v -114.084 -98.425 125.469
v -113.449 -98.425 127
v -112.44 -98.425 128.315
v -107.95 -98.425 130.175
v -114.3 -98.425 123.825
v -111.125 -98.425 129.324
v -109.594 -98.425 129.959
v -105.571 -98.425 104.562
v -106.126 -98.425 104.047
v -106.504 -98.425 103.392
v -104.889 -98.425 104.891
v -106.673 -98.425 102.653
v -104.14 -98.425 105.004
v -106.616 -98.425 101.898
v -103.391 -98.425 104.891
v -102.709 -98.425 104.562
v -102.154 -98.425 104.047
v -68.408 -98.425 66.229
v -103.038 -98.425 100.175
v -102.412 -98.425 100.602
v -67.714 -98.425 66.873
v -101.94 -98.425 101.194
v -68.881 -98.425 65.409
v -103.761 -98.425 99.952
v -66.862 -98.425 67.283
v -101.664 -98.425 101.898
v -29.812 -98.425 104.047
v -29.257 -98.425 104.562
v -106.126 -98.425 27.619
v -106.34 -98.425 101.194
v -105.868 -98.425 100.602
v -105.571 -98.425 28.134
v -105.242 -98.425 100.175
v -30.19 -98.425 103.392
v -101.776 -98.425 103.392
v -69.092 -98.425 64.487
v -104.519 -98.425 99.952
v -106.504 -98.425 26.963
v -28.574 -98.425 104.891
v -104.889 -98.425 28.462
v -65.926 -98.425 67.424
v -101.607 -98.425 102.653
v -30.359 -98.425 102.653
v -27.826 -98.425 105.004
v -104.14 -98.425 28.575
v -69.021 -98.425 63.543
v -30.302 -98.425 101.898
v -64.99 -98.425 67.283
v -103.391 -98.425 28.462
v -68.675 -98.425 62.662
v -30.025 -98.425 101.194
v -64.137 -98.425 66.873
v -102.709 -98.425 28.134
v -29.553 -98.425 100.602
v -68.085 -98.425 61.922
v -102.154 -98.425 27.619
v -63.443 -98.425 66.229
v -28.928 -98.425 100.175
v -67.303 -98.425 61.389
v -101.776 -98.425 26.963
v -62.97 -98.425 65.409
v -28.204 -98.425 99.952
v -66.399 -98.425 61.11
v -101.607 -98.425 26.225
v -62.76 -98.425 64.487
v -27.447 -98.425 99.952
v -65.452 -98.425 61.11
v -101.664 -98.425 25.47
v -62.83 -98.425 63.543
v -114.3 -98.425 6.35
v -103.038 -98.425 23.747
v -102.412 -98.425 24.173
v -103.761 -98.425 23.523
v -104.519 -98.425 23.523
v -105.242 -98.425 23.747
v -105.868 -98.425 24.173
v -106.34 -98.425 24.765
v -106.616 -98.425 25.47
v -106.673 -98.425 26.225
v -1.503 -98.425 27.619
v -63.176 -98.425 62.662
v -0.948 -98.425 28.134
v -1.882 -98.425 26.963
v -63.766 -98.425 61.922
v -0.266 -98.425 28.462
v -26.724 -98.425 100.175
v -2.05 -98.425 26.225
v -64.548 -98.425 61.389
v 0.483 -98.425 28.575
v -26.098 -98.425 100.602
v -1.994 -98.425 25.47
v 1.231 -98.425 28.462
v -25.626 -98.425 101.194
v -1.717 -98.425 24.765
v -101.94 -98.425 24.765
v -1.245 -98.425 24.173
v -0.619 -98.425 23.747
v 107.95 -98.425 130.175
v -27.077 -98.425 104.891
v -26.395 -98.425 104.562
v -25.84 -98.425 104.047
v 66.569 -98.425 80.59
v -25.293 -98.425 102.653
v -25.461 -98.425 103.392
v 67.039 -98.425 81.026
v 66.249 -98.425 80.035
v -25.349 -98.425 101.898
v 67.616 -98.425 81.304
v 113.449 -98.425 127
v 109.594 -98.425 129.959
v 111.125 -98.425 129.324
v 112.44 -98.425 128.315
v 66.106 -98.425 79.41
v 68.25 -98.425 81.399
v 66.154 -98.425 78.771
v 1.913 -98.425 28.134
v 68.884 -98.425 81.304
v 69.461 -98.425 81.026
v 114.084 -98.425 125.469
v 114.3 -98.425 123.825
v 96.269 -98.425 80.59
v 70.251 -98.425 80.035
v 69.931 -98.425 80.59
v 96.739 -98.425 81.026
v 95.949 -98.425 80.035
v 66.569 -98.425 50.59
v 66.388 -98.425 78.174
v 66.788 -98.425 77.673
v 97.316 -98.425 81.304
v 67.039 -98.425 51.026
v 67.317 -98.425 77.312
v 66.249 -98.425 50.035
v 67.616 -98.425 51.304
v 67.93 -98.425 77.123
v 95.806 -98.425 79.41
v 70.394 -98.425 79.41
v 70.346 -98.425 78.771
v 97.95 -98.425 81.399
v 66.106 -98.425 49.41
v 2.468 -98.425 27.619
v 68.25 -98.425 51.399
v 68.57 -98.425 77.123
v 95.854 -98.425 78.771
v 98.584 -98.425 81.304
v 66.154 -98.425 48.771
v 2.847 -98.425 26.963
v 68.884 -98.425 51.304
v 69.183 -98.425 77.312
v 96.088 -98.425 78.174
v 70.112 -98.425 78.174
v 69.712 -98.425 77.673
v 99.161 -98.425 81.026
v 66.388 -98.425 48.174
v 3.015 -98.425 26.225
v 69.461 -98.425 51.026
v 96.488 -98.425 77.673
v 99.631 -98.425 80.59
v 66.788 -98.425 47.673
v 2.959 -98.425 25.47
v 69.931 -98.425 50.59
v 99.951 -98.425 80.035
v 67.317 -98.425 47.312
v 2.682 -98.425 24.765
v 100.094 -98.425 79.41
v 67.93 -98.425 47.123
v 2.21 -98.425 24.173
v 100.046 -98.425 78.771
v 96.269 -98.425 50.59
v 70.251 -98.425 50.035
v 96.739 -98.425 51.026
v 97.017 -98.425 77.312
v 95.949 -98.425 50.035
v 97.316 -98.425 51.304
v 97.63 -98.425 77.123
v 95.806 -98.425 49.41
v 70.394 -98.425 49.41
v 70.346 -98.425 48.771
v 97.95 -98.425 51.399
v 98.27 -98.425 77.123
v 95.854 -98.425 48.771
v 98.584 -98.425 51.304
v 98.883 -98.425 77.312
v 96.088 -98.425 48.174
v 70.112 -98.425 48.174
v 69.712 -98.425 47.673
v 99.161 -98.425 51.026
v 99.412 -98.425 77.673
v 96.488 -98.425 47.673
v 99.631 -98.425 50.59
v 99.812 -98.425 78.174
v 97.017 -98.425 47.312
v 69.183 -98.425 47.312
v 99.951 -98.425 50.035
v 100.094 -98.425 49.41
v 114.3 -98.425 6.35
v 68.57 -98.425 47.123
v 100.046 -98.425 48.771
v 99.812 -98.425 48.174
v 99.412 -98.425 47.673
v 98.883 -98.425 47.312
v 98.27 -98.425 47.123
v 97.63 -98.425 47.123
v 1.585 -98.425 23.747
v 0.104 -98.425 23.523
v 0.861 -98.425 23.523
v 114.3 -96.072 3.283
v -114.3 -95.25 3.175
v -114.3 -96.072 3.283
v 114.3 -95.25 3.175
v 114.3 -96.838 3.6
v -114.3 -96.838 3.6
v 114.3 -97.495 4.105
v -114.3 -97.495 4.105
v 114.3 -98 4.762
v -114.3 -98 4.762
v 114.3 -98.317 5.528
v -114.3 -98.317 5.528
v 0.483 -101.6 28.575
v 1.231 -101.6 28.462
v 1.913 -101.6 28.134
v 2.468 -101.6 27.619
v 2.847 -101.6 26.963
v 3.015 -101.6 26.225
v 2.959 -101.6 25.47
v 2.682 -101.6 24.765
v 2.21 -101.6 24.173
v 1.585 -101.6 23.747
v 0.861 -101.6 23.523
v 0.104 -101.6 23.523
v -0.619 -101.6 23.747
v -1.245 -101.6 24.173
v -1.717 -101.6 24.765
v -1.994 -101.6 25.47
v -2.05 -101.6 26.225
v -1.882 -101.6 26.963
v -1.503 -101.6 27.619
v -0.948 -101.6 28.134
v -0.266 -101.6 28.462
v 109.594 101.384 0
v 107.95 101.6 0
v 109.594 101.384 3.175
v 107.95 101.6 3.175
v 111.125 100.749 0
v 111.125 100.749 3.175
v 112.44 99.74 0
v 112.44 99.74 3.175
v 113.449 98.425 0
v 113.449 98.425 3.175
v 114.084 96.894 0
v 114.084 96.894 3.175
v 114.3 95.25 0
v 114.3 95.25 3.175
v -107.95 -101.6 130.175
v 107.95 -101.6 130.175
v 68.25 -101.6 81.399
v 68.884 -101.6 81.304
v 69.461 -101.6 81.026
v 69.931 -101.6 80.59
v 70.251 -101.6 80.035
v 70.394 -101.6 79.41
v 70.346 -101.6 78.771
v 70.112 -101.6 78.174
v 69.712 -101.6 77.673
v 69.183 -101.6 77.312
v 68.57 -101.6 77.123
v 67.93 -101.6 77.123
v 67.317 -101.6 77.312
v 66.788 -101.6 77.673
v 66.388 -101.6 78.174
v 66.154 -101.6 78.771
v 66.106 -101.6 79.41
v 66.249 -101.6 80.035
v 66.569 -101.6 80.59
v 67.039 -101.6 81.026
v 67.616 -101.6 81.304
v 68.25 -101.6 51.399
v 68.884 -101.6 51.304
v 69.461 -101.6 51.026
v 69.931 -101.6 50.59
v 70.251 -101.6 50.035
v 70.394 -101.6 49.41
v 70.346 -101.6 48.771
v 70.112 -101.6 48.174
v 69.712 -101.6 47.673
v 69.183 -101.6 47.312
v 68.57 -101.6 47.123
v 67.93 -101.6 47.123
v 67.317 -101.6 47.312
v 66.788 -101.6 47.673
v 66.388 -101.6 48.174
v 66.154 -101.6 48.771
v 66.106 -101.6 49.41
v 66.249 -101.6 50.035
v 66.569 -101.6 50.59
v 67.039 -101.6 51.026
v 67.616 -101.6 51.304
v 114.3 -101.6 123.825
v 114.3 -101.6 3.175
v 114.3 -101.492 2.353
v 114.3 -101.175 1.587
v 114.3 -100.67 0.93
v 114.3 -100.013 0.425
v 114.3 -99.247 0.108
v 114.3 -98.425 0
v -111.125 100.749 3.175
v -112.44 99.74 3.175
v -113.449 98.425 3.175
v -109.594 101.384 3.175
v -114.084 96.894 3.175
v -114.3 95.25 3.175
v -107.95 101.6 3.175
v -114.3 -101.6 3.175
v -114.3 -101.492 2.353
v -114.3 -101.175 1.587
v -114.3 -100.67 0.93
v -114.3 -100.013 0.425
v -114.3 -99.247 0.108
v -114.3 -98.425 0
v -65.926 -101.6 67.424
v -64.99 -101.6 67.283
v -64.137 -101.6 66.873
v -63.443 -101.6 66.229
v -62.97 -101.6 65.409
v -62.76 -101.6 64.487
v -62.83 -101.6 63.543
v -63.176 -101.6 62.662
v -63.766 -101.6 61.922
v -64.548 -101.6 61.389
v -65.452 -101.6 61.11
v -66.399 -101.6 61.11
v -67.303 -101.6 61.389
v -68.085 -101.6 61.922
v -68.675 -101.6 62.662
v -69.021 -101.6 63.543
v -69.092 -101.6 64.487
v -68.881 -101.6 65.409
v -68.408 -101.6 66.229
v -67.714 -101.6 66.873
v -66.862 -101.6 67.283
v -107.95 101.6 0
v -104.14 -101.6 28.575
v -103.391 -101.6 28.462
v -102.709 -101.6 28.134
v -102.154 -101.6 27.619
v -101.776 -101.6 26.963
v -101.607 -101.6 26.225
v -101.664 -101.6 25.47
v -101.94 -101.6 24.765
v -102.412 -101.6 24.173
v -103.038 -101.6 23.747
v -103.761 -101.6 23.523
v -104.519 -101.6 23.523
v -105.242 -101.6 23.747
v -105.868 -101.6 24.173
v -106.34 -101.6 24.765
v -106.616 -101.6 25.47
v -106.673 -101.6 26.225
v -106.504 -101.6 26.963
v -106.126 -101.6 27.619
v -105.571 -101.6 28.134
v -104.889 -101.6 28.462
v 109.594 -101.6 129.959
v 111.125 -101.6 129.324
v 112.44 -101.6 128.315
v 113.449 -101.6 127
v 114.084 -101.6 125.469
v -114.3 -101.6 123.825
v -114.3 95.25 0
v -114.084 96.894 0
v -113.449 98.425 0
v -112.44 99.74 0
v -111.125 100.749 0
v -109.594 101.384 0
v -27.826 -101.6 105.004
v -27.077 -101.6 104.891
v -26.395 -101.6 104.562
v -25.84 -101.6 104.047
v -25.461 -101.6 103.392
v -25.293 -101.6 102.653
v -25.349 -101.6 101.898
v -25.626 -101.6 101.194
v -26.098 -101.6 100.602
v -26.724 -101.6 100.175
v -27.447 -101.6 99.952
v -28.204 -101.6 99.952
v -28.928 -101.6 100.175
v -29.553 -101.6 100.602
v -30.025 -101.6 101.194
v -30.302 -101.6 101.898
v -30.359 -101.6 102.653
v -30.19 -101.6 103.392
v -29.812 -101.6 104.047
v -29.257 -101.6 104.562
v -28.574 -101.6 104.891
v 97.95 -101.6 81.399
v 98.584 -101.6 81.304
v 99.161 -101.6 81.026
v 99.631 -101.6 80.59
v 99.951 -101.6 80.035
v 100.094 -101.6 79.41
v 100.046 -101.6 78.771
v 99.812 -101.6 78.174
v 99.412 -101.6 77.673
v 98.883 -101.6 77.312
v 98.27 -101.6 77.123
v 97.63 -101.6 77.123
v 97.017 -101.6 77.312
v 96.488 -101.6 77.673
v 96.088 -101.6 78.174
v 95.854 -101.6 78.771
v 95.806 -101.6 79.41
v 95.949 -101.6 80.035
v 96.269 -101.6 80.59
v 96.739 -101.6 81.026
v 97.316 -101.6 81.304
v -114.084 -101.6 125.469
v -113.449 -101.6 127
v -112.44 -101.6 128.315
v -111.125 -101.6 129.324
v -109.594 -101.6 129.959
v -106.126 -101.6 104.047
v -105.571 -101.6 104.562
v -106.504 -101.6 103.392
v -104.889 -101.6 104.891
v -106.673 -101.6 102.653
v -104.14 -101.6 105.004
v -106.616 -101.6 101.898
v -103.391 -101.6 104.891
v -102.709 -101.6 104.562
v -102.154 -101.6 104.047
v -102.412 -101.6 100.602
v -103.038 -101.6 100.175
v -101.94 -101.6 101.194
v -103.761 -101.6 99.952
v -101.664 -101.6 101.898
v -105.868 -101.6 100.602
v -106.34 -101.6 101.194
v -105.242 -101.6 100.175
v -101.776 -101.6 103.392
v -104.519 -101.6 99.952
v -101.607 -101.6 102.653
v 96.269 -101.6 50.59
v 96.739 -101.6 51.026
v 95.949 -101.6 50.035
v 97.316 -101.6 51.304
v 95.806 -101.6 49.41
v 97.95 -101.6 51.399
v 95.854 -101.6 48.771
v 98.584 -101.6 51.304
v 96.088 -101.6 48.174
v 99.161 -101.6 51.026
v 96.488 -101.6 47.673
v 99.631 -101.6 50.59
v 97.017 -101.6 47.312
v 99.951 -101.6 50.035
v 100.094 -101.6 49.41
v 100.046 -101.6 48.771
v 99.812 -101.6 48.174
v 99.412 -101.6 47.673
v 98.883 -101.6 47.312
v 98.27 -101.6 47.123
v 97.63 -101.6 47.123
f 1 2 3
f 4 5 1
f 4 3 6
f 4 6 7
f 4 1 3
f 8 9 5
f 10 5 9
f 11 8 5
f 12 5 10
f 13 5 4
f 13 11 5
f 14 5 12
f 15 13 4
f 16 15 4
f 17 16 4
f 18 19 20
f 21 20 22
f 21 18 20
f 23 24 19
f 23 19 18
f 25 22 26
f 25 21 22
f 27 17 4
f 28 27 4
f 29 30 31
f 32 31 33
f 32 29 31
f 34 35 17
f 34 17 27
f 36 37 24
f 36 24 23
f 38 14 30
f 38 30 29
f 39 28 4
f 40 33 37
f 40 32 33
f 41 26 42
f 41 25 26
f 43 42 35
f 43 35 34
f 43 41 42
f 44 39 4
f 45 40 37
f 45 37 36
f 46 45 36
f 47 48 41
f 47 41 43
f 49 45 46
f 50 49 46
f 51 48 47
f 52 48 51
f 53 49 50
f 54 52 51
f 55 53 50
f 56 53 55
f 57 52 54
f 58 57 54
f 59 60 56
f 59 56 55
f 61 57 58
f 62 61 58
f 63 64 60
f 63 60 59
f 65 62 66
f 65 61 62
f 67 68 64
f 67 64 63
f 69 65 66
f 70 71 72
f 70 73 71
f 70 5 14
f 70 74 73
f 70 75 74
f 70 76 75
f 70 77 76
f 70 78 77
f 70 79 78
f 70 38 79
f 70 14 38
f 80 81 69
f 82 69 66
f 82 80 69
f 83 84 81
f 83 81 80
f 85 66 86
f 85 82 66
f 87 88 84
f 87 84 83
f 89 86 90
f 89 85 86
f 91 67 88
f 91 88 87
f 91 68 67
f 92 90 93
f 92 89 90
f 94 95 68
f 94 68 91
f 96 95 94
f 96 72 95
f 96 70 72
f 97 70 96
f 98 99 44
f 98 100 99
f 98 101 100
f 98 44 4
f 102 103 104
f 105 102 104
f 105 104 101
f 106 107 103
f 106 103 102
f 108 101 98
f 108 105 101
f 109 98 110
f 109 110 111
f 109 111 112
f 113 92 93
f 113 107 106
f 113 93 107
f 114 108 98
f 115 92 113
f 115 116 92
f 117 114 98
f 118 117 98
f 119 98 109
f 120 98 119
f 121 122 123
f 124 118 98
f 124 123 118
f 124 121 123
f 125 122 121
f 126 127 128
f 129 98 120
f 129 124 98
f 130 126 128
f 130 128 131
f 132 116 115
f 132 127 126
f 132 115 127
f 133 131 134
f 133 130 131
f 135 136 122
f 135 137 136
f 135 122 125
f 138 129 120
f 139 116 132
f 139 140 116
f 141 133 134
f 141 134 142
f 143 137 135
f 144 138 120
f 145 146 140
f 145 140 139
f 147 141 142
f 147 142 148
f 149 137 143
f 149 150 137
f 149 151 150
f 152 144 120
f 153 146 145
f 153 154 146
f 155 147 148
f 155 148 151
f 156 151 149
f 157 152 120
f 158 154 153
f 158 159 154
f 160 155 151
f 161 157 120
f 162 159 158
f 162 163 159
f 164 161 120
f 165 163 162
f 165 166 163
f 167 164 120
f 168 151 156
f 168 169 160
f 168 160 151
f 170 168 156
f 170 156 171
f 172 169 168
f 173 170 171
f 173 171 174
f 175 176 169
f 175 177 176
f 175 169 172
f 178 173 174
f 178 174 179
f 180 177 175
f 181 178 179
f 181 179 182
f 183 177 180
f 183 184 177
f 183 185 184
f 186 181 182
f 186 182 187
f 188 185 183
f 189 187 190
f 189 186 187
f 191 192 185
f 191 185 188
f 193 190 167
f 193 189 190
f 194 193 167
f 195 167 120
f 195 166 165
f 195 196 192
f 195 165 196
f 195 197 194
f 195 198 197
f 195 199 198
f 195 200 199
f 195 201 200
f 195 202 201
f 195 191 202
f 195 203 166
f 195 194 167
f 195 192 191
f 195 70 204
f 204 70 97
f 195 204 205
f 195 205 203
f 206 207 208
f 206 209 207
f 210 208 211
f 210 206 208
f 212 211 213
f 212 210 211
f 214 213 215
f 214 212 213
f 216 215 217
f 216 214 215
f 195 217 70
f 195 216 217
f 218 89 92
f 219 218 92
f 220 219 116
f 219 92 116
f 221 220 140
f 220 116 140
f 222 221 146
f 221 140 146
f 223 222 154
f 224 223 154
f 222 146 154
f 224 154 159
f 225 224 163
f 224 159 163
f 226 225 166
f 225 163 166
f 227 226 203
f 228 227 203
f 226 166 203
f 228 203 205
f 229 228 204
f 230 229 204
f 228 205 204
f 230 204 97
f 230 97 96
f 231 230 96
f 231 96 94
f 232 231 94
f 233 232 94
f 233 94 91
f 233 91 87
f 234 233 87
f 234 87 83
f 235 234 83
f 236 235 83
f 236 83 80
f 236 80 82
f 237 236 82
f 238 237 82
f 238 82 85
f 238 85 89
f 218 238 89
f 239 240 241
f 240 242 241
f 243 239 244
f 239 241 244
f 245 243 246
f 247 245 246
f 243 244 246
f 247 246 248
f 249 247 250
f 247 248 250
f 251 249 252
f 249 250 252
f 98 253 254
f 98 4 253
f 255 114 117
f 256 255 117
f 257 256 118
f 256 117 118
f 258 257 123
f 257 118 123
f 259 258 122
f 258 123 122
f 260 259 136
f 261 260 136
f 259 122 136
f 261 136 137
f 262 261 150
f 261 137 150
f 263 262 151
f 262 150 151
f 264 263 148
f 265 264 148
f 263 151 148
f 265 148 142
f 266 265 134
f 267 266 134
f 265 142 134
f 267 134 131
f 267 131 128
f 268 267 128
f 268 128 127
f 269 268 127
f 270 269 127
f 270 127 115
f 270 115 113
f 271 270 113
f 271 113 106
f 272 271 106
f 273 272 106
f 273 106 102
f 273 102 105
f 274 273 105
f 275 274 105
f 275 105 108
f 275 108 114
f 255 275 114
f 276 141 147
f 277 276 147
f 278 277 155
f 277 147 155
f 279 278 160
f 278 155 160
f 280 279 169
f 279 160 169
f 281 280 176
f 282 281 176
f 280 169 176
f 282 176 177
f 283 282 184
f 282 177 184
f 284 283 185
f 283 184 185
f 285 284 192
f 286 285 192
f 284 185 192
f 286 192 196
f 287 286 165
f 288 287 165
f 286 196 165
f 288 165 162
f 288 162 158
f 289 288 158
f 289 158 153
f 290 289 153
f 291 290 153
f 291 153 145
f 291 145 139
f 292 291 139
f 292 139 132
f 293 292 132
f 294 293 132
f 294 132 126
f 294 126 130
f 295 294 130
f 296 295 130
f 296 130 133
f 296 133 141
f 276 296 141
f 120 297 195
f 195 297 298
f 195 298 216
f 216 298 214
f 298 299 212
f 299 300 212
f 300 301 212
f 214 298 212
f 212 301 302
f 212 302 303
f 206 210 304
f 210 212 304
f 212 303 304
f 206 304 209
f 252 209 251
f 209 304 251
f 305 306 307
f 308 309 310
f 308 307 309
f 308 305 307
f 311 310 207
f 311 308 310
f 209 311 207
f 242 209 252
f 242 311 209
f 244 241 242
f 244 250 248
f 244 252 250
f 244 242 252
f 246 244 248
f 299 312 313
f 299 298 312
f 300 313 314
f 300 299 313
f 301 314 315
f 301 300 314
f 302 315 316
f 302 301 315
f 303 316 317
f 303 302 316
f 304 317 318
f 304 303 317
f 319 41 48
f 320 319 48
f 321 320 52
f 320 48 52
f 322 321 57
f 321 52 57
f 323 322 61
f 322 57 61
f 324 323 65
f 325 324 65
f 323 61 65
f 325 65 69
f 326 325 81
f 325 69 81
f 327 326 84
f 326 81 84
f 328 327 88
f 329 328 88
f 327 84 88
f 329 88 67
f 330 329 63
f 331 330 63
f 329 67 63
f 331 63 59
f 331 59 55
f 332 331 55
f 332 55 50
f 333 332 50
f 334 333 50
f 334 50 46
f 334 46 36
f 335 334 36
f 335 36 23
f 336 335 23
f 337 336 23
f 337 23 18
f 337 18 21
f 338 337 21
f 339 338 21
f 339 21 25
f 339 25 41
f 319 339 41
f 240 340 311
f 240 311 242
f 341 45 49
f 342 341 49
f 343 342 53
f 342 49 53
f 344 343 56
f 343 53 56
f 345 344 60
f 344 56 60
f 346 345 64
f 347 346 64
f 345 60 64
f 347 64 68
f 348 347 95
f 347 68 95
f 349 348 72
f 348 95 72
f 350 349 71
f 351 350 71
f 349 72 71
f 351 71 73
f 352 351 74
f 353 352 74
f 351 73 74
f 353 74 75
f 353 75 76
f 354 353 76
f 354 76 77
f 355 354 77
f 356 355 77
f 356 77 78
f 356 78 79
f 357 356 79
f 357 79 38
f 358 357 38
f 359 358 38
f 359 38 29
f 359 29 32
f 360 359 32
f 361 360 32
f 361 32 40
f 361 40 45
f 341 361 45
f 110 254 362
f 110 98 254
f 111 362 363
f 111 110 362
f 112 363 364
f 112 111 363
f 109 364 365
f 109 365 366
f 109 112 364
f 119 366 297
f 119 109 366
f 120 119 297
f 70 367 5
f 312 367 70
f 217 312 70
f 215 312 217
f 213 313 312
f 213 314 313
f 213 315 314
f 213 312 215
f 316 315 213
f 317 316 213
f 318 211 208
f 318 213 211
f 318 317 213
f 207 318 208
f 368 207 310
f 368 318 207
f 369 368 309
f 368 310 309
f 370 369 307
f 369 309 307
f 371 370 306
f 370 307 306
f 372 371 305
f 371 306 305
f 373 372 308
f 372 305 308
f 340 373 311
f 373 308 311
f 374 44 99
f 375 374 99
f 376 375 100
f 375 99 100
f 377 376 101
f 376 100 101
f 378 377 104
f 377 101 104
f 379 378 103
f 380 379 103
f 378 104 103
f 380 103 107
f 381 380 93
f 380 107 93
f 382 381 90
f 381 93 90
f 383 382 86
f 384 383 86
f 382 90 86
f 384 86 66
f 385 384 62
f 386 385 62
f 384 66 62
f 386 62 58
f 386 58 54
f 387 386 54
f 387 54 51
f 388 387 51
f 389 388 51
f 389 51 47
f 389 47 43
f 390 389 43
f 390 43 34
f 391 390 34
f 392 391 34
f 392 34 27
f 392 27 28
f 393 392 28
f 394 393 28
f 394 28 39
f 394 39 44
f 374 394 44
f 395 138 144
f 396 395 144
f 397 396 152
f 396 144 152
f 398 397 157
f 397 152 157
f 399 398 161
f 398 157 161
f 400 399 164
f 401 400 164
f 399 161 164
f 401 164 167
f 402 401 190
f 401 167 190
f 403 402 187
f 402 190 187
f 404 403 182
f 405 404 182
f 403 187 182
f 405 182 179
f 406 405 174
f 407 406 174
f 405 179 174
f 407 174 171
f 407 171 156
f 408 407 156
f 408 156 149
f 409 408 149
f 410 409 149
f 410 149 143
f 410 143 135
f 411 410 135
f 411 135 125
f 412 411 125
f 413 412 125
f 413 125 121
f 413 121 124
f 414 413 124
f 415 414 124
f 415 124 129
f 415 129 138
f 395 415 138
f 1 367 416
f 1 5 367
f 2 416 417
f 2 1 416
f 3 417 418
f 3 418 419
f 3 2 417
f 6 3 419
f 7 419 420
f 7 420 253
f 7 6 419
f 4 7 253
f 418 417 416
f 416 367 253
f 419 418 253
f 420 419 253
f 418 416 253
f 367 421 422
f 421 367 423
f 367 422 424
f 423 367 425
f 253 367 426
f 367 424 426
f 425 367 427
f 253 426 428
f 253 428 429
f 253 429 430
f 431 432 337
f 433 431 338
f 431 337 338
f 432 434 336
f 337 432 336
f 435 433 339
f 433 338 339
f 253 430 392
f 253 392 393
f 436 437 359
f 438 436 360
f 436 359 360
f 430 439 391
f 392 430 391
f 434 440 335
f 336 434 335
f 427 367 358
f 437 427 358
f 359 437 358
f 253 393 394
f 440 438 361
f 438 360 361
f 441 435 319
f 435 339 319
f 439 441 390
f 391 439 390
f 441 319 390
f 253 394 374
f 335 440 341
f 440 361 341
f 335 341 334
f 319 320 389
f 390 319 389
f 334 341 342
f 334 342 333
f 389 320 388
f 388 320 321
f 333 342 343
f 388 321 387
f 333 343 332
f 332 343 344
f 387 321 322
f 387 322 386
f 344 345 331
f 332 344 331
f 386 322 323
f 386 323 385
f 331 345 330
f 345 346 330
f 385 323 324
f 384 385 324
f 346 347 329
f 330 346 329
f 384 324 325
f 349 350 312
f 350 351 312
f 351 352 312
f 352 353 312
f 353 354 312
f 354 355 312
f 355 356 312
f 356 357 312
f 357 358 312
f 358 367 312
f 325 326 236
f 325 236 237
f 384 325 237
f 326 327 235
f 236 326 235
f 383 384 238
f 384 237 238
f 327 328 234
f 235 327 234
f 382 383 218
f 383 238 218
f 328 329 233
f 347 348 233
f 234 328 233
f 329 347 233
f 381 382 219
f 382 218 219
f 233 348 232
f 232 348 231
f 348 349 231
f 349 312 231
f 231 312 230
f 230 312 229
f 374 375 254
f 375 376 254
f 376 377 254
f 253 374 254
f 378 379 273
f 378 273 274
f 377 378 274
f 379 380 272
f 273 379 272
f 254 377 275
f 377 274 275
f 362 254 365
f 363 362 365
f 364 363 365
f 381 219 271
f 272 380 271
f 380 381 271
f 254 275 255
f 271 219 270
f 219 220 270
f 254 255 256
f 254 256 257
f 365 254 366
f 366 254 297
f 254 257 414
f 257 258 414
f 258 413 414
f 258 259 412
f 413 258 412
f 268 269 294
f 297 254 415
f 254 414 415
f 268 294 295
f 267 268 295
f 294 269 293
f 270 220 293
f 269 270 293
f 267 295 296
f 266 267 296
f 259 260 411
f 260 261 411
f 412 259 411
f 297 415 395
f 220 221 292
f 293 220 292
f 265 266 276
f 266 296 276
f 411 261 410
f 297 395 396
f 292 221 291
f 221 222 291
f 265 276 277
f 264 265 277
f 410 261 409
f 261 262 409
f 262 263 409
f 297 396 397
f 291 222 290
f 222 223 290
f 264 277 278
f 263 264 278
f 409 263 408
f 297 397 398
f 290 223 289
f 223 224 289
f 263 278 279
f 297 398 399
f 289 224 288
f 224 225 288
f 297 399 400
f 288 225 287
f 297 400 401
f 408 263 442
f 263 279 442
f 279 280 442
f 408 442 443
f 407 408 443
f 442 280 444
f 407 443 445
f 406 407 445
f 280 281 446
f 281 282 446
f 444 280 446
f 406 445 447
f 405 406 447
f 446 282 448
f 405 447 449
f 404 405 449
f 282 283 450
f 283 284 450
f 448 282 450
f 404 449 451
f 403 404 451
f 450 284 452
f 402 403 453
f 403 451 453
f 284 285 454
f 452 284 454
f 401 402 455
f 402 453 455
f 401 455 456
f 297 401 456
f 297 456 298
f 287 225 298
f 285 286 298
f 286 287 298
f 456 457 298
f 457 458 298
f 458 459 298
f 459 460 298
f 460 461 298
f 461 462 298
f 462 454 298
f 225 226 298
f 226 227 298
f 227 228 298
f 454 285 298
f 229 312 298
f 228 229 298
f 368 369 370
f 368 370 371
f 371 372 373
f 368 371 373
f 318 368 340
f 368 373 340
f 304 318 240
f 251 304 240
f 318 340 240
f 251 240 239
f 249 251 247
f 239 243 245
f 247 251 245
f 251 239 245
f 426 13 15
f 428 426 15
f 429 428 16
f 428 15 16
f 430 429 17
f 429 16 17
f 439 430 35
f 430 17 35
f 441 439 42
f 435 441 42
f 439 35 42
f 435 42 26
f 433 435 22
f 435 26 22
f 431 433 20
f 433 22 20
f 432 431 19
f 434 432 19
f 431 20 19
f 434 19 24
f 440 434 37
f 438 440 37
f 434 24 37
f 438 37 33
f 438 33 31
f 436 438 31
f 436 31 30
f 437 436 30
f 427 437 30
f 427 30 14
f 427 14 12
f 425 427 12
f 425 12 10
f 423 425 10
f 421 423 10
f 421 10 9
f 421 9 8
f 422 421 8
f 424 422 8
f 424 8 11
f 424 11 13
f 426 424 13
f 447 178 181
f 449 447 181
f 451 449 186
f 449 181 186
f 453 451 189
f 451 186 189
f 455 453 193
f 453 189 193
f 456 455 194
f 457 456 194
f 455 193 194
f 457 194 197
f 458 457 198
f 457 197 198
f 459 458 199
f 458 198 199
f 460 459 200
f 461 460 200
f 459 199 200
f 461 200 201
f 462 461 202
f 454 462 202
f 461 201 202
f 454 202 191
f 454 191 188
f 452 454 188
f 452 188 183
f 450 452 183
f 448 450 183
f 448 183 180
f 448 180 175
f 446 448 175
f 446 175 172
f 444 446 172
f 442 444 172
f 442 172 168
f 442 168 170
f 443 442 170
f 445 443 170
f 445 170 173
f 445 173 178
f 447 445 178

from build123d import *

# Parameters (mm, degrees)
SKETCH2_W           = 228.6
SKETCH2_H           = 203.2
BOSS_EXTRUDE1_DEPTH = 3.175
SKETCH3_W           = 228.6
SKETCH3_H           = 3.175
BOSS_EXTRUDE2_DEPTH = 127
FILLET1_R           = 3.175
FILLET2_R           = 6.35
SKETCH4_R           = 2.54
SKETCH4_R_2         = 2.15
SKETCH4_R_3         = 3.175
CUT_EXTRUDE1_DEPTH  = 265.612965007


with BuildPart() as part:
    # Sketch2 → Boss-Extrude1 (new body)
    with BuildSketch(Plane.XY):
        Rectangle(SKETCH2_W, SKETCH2_H)
    extrude(amount=BOSS_EXTRUDE1_DEPTH)

    # Sketch3 → Boss-Extrude2 (add)
    with BuildSketch(Plane.XY.offset(3.175)):
        with Locations((0, -100.0125)):
            Rectangle(SKETCH3_W, SKETCH3_H)
    extrude(amount=BOSS_EXTRUDE2_DEPTH)

    # Fillet1
    fillet1_edges = [part.edges().sort_by_distance(p)[0] for p in [
        (0, -98.425, 3.175),
        (0, -101.6, 0),
    ]]
    fillet(fillet1_edges, radius=FILLET1_R)

    # Fillet2
    fillet2_edges = [part.edges().sort_by_distance(p)[0] for p in [
        (-114.3, -100.0125, 130.175),
        (114.3, -100.0125, 130.175),
        (-114.3, 101.6, 1.5875),
        (114.3, 101.6, 1.5875),
    ]]
    fillet(fillet2_edges, radius=FILLET2_R)

    # Sketch4 → Cut-Extrude1 (cut, through all)
    with BuildSketch(Plane(origin=(0, -98.425, 0), x_dir=(1, 0, 0), z_dir=(0, 1, 0))):
        with Locations(Location((-104.14, -26.035, 0), (0, 0, 270))):
            Circle(SKETCH4_R)
        with Locations(Location((-104.14, -102.4636, 0), (0, 0, 270))):
            Circle(SKETCH4_R)
        with Locations(Location((0.4826, -26.035, 0), (0, 0, 270))):
            Circle(SKETCH4_R)
        with Locations(Location((-27.8257, -102.4636, 0), (0, 0, 270))):
            Circle(SKETCH4_R)
        with Locations(Location((68.25, -79.2493, 0), (0, 0, 270))):
            Circle(SKETCH4_R_2)
        with Locations(Location((97.95, -79.2493, 0), (0, 0, 270))):
            Circle(SKETCH4_R_2)
        with Locations(Location((68.25, -49.2493, 0), (0, 0, 270))):
            Circle(SKETCH4_R_2)
        with Locations(Location((97.95, -49.2493, 0), (0, 0, 270))):
            Circle(SKETCH4_R_2)
        with Locations(Location((-65.9257, -64.2493, 0), (0, 0, 270))):
            Circle(SKETCH4_R_3)
    extrude(amount=-CUT_EXTRUDE1_DEPTH, mode=Mode.SUBTRACT)


solid = part.part
